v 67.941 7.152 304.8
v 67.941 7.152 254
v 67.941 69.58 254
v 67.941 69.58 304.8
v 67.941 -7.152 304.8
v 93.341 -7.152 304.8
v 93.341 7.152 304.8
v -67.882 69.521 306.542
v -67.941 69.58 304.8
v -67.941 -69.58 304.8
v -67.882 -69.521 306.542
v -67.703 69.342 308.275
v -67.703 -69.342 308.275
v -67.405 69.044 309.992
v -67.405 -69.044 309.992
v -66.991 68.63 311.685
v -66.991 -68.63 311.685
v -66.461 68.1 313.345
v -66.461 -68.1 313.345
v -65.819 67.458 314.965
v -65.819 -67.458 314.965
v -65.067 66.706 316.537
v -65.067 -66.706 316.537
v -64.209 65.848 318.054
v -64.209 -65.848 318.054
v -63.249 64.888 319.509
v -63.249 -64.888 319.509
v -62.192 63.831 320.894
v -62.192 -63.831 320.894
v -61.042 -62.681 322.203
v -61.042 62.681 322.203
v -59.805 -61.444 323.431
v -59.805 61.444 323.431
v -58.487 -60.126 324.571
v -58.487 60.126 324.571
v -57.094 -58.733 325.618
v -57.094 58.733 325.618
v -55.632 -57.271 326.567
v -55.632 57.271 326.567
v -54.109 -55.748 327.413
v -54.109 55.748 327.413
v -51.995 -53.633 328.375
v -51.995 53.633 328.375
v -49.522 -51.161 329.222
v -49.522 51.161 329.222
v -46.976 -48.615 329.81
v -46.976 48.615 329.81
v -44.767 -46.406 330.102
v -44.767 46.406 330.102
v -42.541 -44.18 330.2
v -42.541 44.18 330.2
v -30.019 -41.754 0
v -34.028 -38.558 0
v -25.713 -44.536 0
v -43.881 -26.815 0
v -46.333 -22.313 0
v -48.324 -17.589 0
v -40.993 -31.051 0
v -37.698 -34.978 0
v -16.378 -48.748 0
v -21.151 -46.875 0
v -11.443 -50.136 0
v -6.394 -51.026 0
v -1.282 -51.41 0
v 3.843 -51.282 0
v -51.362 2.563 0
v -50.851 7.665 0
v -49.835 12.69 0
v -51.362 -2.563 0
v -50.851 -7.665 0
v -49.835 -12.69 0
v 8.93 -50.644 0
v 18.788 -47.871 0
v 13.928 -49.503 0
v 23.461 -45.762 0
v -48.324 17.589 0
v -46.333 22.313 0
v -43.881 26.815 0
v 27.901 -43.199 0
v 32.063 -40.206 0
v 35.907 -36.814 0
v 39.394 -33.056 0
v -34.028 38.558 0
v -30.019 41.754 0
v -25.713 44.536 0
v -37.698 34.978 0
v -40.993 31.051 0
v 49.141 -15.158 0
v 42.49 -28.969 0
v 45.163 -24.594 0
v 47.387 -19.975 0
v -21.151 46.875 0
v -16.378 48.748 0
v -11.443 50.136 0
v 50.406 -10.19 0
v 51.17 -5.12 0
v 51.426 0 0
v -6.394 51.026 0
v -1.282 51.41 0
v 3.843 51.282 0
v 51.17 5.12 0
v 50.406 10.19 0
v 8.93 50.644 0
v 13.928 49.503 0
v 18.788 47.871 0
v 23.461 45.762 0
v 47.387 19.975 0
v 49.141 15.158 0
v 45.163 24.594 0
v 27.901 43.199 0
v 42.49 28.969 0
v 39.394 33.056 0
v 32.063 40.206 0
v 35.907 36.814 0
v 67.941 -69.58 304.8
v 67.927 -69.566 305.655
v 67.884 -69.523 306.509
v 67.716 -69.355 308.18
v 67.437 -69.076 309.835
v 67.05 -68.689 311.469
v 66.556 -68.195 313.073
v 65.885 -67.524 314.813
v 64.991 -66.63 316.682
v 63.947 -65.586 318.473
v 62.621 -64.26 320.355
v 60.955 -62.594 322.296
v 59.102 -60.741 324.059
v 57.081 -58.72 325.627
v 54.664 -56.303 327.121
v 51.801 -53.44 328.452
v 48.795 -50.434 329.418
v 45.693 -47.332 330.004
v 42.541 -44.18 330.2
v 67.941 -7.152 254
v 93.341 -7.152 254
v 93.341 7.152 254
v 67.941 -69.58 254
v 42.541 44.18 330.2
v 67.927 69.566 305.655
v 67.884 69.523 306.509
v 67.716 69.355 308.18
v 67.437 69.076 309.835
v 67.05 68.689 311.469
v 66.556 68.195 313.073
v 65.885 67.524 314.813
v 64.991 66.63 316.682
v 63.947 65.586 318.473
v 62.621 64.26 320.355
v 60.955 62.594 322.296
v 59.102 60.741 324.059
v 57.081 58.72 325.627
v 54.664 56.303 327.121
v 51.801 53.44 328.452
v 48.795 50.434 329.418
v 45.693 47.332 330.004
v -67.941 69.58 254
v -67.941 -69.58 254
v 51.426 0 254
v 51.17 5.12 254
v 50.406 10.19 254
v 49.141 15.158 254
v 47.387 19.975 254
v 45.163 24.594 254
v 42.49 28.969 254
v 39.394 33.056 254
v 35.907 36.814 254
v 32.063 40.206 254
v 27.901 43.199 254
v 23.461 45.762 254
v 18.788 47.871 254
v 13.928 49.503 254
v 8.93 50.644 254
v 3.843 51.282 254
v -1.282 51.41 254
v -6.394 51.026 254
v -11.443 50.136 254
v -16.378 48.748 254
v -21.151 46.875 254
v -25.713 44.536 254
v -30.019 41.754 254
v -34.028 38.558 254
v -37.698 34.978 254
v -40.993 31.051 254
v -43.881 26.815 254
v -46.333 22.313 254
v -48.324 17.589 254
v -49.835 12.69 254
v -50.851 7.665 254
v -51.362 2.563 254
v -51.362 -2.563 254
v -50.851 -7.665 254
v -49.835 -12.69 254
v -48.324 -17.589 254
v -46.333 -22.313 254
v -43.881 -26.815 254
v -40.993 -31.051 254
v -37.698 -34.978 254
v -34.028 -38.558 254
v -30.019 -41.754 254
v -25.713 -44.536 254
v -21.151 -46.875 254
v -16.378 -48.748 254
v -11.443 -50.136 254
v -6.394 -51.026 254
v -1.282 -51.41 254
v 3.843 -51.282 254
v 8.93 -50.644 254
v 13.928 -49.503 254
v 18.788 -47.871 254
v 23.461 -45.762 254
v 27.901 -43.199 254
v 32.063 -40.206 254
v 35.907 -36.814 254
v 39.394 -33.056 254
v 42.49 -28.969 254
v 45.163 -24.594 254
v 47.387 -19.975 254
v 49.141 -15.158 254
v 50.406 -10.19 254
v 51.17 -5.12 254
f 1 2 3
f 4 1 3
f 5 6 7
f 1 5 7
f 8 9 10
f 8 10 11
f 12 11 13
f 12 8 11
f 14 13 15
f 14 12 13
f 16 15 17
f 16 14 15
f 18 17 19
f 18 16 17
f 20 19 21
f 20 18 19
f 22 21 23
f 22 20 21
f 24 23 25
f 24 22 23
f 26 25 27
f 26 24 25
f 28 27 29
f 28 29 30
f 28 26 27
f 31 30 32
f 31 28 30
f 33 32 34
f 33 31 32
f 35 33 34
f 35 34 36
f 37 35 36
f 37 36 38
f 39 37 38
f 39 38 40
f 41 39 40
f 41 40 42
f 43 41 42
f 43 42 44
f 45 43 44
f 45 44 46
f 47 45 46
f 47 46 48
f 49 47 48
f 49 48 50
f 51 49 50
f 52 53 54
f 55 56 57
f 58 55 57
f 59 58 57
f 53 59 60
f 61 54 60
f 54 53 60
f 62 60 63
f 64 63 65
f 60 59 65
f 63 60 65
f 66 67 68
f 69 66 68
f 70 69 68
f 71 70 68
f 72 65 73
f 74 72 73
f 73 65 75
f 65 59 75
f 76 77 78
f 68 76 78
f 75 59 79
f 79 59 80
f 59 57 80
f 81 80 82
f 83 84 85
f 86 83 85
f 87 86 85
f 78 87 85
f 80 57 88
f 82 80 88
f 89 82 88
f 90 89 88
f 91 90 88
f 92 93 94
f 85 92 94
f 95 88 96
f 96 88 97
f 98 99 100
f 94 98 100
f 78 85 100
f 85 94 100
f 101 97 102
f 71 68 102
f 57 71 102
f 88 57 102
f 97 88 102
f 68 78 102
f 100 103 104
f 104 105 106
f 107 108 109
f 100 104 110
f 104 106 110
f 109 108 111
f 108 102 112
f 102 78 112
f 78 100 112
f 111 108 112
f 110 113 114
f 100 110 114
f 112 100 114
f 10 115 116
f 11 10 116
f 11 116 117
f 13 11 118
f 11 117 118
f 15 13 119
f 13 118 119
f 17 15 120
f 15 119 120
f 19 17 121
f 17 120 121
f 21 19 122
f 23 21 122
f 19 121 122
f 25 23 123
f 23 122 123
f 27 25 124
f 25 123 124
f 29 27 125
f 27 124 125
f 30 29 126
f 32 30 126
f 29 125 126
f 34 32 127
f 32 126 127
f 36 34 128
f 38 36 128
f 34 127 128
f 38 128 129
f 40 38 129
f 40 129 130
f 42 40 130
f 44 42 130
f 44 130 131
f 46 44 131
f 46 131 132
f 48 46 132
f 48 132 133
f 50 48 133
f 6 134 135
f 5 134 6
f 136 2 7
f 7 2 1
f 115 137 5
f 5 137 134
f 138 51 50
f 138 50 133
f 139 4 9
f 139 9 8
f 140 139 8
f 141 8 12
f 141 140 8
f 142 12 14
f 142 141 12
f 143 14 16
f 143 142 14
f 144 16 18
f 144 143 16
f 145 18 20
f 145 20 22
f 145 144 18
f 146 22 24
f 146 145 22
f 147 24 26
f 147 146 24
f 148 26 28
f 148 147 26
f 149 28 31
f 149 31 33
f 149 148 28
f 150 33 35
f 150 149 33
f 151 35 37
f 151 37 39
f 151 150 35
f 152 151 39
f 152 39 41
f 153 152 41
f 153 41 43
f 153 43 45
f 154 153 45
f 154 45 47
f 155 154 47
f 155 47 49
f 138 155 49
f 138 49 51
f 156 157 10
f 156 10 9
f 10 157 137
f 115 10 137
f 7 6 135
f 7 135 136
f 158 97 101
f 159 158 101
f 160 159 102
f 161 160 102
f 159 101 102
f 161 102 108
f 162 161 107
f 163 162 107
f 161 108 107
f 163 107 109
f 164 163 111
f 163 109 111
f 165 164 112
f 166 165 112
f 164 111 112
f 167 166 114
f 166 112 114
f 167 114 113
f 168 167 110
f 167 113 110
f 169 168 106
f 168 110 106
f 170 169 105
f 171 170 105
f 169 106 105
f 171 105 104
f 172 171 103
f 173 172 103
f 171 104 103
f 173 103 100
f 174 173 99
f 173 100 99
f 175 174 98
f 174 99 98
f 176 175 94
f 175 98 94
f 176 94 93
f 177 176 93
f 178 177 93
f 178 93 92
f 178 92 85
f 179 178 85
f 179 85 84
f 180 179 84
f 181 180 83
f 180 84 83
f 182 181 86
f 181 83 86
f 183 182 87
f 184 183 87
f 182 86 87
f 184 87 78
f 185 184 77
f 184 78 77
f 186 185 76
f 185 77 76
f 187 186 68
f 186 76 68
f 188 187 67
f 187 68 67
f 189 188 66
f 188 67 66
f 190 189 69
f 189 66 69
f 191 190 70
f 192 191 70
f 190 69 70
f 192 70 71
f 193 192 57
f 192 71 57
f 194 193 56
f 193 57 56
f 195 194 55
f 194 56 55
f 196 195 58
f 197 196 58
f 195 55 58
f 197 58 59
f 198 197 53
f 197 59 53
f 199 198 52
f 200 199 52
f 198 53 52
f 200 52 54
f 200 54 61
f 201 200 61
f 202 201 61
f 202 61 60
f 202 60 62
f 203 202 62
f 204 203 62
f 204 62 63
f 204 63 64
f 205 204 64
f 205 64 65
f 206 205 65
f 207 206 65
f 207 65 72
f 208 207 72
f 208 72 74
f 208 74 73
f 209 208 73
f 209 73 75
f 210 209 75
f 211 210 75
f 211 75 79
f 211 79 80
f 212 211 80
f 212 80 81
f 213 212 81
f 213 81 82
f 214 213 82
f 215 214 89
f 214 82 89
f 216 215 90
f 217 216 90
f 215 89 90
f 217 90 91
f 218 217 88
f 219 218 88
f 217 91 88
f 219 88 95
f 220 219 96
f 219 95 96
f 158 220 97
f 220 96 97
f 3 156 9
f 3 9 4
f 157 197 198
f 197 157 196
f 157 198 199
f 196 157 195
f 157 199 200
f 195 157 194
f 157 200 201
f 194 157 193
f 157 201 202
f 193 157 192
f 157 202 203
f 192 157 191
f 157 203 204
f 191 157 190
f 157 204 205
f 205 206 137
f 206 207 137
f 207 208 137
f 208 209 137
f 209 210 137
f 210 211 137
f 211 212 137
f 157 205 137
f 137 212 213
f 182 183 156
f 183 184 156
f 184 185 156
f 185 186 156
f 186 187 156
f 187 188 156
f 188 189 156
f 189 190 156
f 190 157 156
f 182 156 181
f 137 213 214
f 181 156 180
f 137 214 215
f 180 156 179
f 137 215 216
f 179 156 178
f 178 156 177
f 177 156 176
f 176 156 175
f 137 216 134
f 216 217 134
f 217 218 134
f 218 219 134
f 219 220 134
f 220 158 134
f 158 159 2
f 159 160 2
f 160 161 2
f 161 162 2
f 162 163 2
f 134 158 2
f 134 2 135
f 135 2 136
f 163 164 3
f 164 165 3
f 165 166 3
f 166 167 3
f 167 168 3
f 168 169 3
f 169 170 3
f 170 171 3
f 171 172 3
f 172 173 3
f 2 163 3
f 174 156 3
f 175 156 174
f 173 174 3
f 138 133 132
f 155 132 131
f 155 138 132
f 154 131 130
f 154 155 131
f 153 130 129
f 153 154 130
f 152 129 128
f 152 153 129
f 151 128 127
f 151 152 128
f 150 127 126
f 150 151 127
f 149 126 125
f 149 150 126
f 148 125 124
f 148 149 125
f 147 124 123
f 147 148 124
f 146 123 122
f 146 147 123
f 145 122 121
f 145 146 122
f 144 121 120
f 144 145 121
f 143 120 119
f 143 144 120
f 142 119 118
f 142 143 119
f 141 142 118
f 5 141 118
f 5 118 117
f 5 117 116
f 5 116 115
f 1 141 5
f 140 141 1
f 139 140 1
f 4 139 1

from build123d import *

# Parameters (mm, degrees)
F0_R     = 51.425526
F1_DEPTH = 254
F2_W     = 135.8829
F2_H     = 139.160782
F3_DEPTH = 76.2
F4_R     = 25.4
F5_W     = 14.30345
F5_H     = 50.8
F6_DEPTH = 25.4


with BuildPart() as f1:
    # F0 (on Top) → F1 (new body)
    with BuildSketch(Plane.XY):
        Circle(F0_R)
    extrude(amount=F1_DEPTH)

    # F2 (on face) → F3 (join)
    with BuildSketch(Plane.XY.offset(254)):
        Rectangle(F2_W, F2_H)
    extrude(amount=F3_DEPTH)

    # F4
    f4_edges = [f1.edges().sort_by_distance(p)[0] for p in [
        (67.94145, 0, 330.2),
        (0, 69.580391, 330.2),
        (-67.94145, 0, 330.2),
        (0, -69.580391, 330.2),
    ]]
    fillet(f4_edges, radius=F4_R)

    # F5 (on face) → F6 (join)
    with BuildSketch(Plane.YZ.offset(67.94145)):
        with Locations((0, 279.4)):
            Rectangle(F5_W, F5_H)
    extrude(amount=F6_DEPTH)


solid = f1.part
